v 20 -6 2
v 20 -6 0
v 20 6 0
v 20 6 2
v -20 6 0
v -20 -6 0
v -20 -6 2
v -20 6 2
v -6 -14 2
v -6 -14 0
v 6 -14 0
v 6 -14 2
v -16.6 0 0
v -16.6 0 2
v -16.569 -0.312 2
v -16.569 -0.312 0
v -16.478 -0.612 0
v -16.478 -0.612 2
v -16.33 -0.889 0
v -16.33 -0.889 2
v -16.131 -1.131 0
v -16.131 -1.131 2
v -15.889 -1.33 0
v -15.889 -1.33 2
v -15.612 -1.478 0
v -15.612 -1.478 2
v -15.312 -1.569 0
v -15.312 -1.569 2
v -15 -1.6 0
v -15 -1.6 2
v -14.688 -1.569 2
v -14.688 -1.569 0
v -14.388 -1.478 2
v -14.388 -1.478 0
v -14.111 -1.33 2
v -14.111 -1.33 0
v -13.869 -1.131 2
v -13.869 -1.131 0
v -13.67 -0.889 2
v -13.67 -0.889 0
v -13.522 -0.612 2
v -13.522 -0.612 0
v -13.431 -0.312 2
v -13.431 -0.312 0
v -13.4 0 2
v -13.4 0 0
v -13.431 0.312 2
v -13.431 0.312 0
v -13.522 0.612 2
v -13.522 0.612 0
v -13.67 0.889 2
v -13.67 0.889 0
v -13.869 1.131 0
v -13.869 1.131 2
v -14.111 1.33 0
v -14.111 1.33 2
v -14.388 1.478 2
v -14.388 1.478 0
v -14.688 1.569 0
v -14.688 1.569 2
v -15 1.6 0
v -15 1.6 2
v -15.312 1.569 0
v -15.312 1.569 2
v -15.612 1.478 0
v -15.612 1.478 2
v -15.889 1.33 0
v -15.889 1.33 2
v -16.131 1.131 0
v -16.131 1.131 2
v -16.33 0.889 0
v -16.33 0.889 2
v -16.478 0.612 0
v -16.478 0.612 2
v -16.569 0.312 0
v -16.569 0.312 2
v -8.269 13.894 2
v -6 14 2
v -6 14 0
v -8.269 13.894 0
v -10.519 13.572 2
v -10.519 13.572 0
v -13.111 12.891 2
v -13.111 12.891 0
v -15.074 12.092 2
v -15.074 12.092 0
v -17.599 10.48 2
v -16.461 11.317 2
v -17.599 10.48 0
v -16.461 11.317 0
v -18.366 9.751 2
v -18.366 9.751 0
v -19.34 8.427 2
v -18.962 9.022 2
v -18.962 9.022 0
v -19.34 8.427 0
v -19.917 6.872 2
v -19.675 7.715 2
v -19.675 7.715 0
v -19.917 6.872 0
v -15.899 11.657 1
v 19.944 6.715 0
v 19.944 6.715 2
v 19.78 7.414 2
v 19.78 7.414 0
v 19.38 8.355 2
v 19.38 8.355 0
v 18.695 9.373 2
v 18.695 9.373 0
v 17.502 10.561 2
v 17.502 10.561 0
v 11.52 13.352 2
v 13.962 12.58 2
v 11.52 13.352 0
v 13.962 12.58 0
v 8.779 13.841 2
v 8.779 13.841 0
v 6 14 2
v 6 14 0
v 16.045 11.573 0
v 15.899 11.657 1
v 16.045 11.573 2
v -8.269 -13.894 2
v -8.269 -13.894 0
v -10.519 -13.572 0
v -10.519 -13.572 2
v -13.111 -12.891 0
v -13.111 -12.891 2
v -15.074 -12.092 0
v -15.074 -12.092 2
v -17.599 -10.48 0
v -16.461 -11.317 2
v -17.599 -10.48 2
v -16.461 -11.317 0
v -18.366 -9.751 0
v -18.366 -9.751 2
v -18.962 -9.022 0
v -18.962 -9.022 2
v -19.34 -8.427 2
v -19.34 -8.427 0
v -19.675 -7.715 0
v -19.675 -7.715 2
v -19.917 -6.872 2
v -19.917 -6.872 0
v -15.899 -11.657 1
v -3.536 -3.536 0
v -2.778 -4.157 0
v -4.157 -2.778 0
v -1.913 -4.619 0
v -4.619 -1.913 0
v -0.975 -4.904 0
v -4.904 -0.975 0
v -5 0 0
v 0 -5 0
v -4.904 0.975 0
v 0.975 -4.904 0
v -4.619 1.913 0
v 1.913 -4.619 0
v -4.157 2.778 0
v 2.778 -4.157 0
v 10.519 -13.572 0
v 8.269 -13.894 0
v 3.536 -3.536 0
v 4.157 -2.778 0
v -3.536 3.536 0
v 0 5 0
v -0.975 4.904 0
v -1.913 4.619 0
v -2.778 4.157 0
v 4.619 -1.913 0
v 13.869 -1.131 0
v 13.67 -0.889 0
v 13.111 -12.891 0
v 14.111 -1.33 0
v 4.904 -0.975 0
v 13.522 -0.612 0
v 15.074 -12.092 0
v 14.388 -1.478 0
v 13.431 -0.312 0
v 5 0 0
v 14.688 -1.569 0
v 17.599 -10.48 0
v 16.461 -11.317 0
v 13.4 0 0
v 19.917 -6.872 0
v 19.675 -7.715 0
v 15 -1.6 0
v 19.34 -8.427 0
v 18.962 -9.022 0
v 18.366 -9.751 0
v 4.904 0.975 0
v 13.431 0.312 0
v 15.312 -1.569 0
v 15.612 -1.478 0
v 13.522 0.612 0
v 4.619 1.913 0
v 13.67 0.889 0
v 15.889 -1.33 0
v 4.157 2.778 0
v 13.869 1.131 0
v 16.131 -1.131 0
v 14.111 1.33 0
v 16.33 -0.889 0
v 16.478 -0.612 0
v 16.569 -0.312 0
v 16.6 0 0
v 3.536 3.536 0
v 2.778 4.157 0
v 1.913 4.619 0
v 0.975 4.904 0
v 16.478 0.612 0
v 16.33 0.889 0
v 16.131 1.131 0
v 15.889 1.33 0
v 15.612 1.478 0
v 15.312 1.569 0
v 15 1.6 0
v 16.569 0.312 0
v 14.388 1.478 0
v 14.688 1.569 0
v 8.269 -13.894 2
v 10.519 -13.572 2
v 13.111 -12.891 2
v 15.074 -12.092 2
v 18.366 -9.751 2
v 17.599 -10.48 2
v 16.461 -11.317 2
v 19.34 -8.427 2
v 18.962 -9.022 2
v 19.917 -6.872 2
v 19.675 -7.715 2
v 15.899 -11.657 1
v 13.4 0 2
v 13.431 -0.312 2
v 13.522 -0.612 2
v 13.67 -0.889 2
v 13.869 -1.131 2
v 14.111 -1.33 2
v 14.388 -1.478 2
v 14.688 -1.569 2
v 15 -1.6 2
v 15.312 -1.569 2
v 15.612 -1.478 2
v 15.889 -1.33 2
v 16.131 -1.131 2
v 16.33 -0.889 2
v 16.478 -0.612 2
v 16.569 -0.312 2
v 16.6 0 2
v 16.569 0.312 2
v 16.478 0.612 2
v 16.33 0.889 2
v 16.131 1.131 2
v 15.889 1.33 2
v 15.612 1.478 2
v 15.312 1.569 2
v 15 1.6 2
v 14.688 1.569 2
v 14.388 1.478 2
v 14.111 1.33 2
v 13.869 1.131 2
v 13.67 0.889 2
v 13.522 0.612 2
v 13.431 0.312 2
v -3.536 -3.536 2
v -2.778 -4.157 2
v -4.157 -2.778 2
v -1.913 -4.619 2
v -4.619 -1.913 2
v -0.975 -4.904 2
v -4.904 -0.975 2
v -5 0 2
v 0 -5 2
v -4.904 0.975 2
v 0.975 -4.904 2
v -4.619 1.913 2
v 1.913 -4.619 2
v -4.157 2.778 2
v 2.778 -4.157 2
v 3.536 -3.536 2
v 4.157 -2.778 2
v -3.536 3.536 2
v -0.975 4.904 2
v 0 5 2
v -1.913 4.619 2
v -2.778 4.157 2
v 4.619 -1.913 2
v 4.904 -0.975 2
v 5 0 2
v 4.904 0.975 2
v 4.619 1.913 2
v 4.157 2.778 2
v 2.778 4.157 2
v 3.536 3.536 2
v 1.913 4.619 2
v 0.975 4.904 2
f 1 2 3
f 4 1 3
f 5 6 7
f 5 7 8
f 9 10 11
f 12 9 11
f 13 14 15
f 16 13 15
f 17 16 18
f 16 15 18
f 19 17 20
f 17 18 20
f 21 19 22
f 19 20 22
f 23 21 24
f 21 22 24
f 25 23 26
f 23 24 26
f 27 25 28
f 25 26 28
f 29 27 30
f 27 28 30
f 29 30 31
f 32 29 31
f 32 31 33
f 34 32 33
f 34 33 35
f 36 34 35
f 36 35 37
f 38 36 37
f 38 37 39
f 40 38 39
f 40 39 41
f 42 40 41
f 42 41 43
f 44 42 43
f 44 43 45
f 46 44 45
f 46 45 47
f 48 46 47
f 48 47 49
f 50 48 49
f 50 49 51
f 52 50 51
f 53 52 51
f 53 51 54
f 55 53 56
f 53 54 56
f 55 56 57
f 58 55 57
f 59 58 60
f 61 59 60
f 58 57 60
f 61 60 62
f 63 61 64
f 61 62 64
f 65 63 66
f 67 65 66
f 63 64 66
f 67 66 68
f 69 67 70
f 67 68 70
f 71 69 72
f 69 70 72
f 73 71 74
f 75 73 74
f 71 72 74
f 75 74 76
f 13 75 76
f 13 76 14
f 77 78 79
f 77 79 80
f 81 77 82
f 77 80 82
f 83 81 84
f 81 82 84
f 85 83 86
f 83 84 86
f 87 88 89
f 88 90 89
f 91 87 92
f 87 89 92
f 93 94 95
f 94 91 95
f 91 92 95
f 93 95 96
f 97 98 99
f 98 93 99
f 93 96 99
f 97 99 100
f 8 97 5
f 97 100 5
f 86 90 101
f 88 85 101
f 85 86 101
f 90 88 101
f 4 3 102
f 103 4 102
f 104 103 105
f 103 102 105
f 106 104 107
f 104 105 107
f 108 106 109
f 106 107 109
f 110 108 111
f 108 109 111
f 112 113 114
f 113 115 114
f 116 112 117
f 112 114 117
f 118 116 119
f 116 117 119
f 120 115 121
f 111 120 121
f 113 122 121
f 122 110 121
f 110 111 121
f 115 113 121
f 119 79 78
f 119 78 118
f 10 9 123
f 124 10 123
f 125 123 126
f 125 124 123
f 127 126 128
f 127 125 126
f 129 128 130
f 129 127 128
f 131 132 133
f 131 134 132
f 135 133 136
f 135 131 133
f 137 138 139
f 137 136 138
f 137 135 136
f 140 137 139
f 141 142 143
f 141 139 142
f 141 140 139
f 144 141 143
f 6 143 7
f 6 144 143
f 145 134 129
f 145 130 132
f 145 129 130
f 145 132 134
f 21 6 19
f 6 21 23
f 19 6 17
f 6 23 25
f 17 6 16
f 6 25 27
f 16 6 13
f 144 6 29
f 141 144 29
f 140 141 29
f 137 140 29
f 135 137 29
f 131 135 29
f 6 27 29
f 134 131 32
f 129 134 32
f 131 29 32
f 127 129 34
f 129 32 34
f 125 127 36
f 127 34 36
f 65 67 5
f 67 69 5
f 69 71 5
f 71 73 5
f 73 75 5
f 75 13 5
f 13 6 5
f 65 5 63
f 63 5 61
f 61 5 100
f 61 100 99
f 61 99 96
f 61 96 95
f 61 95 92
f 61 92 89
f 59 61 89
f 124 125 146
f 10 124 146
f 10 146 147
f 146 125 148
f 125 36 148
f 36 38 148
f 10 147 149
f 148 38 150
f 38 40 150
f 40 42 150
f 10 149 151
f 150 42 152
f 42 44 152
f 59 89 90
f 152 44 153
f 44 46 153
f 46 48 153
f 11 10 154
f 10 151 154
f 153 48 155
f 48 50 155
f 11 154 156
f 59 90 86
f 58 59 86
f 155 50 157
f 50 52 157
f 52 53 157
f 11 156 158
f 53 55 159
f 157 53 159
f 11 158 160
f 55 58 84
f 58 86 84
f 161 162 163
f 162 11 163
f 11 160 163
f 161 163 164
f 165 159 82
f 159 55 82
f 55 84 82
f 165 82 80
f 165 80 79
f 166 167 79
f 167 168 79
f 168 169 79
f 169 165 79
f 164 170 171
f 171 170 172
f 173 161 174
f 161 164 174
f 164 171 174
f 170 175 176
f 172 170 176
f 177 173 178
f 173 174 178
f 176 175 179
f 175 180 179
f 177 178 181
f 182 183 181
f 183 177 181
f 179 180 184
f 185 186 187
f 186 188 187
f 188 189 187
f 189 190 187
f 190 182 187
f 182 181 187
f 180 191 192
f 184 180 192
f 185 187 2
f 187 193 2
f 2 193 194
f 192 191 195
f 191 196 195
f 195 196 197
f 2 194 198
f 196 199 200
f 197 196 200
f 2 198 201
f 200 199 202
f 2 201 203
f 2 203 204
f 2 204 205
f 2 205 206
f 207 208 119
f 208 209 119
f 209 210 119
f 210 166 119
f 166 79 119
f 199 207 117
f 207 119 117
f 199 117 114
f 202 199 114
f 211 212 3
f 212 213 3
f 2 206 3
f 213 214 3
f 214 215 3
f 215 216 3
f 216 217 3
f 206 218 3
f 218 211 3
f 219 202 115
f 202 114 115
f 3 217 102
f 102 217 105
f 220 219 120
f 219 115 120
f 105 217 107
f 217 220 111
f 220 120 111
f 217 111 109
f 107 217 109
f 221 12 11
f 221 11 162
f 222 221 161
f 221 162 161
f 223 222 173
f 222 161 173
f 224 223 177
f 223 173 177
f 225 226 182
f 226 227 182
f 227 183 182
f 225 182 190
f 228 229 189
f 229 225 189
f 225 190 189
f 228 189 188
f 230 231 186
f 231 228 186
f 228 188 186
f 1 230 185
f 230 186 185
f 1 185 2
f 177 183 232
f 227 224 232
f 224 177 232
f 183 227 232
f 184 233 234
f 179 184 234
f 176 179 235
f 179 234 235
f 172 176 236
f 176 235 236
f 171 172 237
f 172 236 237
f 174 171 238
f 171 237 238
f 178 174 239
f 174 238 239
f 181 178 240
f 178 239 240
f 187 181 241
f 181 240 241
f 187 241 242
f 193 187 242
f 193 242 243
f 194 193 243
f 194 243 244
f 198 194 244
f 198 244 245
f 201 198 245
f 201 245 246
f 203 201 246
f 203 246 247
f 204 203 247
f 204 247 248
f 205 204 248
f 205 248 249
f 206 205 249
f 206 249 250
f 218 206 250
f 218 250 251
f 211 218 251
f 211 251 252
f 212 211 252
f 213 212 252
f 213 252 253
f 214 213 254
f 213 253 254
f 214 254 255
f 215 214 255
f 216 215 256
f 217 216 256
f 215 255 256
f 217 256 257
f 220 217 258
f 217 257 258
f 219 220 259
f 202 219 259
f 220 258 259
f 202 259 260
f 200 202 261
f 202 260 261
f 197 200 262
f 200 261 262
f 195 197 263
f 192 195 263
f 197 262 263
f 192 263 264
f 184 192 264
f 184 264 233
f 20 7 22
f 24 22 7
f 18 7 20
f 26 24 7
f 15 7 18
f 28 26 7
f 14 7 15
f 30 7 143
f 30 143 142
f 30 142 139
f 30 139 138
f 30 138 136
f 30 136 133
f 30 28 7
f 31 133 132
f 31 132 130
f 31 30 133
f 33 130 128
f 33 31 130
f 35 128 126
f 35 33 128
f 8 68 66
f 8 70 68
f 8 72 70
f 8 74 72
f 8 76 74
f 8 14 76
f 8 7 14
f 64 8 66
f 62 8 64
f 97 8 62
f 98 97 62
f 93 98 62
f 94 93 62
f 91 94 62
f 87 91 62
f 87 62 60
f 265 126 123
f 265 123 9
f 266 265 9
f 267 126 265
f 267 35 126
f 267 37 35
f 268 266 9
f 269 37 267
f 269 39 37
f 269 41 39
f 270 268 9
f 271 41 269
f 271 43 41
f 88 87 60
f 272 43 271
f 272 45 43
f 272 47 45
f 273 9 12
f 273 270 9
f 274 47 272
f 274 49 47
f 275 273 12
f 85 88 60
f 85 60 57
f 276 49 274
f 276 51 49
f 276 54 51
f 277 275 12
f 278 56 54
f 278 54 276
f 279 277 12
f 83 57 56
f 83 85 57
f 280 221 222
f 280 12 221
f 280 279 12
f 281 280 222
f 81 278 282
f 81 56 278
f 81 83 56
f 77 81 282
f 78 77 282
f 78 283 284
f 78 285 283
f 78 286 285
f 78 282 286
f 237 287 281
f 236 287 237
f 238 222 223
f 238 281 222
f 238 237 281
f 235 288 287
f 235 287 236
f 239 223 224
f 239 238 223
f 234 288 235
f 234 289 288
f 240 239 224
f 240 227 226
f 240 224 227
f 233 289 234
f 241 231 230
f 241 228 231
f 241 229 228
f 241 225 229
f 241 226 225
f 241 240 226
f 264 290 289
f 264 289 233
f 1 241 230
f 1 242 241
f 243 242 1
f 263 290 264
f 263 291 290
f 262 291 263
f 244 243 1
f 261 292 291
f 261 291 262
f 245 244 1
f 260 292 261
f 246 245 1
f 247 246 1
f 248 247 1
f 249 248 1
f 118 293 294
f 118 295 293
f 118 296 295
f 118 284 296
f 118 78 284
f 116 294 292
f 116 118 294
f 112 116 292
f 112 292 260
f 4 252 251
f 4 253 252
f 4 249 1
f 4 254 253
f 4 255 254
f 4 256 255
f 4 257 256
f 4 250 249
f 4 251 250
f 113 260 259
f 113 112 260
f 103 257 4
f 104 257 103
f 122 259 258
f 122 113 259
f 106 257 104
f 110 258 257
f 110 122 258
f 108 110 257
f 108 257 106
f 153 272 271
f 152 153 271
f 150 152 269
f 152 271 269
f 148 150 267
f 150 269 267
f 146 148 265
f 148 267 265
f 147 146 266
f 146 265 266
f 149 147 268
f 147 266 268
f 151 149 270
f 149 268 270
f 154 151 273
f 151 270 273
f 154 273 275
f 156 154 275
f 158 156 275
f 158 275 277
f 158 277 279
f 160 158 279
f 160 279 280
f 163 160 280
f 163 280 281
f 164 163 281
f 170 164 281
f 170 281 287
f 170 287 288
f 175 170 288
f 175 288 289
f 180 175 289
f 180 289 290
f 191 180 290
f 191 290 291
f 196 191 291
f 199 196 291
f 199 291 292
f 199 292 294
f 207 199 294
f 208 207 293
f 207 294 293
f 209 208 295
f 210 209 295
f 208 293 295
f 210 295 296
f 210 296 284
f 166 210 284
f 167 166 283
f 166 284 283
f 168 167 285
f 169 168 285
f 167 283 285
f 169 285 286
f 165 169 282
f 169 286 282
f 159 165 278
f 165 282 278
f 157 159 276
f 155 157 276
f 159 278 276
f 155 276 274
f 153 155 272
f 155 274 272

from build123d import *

# Parameters (mm, degrees)
SZKIC1_W                    = 40
SZKIC1_H                    = 28
DODANIE_WYCI_GNI_CIE1_DEPTH = 2
ZAOKR_GLENIE1_SIZE          = 14
ZAOKR_GLENIE1_SIZE_2        = 8
SZKIC3_R                    = 1.6
SZKIC3_R_2                  = 5
WYTNIJ_WYCI_GNI_CIE1_DEPTH  = 29.653097735


with BuildPart() as part:
    # Szkic1 → Dodanie-wyciągnięcie1 (new body)
    with BuildSketch(Plane.XY):
        Rectangle(SZKIC1_W, SZKIC1_H)
    extrude(amount=DODANIE_WYCI_GNI_CIE1_DEPTH)

    # Zaokrąglenie1
    # an asymmetric fillet: 14, 8 mm, written as the material it takes off along each edge
    with BuildSketch(Plane(origin=(-20, 14, -35), x_dir=(1, 0, 0), z_dir=(0, 0, 1)), Plane(origin=(20, -14, -35), x_dir=(-1, 0, 0), z_dir=(0, 0, 1))) as zaokr_glenie1_piece_1:
        with BuildLine():
            Bezier((ZAOKR_GLENIE1_SIZE, 0), (0, 0), (0, -ZAOKR_GLENIE1_SIZE_2), weights=[1, 0.707106781, 1])
            Line((0, -ZAOKR_GLENIE1_SIZE_2), (0, 0))
            Line((0, 0), (ZAOKR_GLENIE1_SIZE, 0))
        make_face()
    extrude(amount=72, mode=Mode.SUBTRACT)
    with BuildSketch(Plane(origin=(-20, -14, -35), x_dir=(1, 0, 0), z_dir=(0, 0, 1))) as zaokr_glenie1_piece_2:
        with BuildLine():
            Bezier((ZAOKR_GLENIE1_SIZE, 0), (0, 0), (0, ZAOKR_GLENIE1_SIZE_2), weights=[1, 0.707106781, 1])
            Line((0, ZAOKR_GLENIE1_SIZE_2), (0, 0))
            Line((0, 0), (ZAOKR_GLENIE1_SIZE, 0))
        make_face()
    extrude(amount=72, mode=Mode.SUBTRACT)
    with BuildSketch(Plane(origin=(20, 14, -35), x_dir=(0, -1, 0), z_dir=(0, 0, 1))) as zaokr_glenie1_piece_3:
        with BuildLine():
            Bezier((ZAOKR_GLENIE1_SIZE_2, 0), (0, 0), (0, -ZAOKR_GLENIE1_SIZE), weights=[1, 0.707106781, 1])
            Line((0, -ZAOKR_GLENIE1_SIZE), (0, 0))
            Line((0, 0), (ZAOKR_GLENIE1_SIZE_2, 0))
        make_face()
    extrude(amount=72, mode=Mode.SUBTRACT)

    # Szkic3 → Wytnij-wyciągnięcie1 (cut, through all)
    with BuildSketch(Plane.XY.offset(15)):
        with Locations(Location((-15, -1e-09, 0), (0, 0, 180))):
            Circle(SZKIC3_R)
        with Locations(Location((15, -1e-09, 0), (0, 0, 180))):
            Circle(SZKIC3_R)
        with Locations(Location((0, 0, 0), (0, 0, 180))):
            Circle(SZKIC3_R_2)
    extrude(amount=-WYTNIJ_WYCI_GNI_CIE1_DEPTH, mode=Mode.SUBTRACT)


solid = part.part
